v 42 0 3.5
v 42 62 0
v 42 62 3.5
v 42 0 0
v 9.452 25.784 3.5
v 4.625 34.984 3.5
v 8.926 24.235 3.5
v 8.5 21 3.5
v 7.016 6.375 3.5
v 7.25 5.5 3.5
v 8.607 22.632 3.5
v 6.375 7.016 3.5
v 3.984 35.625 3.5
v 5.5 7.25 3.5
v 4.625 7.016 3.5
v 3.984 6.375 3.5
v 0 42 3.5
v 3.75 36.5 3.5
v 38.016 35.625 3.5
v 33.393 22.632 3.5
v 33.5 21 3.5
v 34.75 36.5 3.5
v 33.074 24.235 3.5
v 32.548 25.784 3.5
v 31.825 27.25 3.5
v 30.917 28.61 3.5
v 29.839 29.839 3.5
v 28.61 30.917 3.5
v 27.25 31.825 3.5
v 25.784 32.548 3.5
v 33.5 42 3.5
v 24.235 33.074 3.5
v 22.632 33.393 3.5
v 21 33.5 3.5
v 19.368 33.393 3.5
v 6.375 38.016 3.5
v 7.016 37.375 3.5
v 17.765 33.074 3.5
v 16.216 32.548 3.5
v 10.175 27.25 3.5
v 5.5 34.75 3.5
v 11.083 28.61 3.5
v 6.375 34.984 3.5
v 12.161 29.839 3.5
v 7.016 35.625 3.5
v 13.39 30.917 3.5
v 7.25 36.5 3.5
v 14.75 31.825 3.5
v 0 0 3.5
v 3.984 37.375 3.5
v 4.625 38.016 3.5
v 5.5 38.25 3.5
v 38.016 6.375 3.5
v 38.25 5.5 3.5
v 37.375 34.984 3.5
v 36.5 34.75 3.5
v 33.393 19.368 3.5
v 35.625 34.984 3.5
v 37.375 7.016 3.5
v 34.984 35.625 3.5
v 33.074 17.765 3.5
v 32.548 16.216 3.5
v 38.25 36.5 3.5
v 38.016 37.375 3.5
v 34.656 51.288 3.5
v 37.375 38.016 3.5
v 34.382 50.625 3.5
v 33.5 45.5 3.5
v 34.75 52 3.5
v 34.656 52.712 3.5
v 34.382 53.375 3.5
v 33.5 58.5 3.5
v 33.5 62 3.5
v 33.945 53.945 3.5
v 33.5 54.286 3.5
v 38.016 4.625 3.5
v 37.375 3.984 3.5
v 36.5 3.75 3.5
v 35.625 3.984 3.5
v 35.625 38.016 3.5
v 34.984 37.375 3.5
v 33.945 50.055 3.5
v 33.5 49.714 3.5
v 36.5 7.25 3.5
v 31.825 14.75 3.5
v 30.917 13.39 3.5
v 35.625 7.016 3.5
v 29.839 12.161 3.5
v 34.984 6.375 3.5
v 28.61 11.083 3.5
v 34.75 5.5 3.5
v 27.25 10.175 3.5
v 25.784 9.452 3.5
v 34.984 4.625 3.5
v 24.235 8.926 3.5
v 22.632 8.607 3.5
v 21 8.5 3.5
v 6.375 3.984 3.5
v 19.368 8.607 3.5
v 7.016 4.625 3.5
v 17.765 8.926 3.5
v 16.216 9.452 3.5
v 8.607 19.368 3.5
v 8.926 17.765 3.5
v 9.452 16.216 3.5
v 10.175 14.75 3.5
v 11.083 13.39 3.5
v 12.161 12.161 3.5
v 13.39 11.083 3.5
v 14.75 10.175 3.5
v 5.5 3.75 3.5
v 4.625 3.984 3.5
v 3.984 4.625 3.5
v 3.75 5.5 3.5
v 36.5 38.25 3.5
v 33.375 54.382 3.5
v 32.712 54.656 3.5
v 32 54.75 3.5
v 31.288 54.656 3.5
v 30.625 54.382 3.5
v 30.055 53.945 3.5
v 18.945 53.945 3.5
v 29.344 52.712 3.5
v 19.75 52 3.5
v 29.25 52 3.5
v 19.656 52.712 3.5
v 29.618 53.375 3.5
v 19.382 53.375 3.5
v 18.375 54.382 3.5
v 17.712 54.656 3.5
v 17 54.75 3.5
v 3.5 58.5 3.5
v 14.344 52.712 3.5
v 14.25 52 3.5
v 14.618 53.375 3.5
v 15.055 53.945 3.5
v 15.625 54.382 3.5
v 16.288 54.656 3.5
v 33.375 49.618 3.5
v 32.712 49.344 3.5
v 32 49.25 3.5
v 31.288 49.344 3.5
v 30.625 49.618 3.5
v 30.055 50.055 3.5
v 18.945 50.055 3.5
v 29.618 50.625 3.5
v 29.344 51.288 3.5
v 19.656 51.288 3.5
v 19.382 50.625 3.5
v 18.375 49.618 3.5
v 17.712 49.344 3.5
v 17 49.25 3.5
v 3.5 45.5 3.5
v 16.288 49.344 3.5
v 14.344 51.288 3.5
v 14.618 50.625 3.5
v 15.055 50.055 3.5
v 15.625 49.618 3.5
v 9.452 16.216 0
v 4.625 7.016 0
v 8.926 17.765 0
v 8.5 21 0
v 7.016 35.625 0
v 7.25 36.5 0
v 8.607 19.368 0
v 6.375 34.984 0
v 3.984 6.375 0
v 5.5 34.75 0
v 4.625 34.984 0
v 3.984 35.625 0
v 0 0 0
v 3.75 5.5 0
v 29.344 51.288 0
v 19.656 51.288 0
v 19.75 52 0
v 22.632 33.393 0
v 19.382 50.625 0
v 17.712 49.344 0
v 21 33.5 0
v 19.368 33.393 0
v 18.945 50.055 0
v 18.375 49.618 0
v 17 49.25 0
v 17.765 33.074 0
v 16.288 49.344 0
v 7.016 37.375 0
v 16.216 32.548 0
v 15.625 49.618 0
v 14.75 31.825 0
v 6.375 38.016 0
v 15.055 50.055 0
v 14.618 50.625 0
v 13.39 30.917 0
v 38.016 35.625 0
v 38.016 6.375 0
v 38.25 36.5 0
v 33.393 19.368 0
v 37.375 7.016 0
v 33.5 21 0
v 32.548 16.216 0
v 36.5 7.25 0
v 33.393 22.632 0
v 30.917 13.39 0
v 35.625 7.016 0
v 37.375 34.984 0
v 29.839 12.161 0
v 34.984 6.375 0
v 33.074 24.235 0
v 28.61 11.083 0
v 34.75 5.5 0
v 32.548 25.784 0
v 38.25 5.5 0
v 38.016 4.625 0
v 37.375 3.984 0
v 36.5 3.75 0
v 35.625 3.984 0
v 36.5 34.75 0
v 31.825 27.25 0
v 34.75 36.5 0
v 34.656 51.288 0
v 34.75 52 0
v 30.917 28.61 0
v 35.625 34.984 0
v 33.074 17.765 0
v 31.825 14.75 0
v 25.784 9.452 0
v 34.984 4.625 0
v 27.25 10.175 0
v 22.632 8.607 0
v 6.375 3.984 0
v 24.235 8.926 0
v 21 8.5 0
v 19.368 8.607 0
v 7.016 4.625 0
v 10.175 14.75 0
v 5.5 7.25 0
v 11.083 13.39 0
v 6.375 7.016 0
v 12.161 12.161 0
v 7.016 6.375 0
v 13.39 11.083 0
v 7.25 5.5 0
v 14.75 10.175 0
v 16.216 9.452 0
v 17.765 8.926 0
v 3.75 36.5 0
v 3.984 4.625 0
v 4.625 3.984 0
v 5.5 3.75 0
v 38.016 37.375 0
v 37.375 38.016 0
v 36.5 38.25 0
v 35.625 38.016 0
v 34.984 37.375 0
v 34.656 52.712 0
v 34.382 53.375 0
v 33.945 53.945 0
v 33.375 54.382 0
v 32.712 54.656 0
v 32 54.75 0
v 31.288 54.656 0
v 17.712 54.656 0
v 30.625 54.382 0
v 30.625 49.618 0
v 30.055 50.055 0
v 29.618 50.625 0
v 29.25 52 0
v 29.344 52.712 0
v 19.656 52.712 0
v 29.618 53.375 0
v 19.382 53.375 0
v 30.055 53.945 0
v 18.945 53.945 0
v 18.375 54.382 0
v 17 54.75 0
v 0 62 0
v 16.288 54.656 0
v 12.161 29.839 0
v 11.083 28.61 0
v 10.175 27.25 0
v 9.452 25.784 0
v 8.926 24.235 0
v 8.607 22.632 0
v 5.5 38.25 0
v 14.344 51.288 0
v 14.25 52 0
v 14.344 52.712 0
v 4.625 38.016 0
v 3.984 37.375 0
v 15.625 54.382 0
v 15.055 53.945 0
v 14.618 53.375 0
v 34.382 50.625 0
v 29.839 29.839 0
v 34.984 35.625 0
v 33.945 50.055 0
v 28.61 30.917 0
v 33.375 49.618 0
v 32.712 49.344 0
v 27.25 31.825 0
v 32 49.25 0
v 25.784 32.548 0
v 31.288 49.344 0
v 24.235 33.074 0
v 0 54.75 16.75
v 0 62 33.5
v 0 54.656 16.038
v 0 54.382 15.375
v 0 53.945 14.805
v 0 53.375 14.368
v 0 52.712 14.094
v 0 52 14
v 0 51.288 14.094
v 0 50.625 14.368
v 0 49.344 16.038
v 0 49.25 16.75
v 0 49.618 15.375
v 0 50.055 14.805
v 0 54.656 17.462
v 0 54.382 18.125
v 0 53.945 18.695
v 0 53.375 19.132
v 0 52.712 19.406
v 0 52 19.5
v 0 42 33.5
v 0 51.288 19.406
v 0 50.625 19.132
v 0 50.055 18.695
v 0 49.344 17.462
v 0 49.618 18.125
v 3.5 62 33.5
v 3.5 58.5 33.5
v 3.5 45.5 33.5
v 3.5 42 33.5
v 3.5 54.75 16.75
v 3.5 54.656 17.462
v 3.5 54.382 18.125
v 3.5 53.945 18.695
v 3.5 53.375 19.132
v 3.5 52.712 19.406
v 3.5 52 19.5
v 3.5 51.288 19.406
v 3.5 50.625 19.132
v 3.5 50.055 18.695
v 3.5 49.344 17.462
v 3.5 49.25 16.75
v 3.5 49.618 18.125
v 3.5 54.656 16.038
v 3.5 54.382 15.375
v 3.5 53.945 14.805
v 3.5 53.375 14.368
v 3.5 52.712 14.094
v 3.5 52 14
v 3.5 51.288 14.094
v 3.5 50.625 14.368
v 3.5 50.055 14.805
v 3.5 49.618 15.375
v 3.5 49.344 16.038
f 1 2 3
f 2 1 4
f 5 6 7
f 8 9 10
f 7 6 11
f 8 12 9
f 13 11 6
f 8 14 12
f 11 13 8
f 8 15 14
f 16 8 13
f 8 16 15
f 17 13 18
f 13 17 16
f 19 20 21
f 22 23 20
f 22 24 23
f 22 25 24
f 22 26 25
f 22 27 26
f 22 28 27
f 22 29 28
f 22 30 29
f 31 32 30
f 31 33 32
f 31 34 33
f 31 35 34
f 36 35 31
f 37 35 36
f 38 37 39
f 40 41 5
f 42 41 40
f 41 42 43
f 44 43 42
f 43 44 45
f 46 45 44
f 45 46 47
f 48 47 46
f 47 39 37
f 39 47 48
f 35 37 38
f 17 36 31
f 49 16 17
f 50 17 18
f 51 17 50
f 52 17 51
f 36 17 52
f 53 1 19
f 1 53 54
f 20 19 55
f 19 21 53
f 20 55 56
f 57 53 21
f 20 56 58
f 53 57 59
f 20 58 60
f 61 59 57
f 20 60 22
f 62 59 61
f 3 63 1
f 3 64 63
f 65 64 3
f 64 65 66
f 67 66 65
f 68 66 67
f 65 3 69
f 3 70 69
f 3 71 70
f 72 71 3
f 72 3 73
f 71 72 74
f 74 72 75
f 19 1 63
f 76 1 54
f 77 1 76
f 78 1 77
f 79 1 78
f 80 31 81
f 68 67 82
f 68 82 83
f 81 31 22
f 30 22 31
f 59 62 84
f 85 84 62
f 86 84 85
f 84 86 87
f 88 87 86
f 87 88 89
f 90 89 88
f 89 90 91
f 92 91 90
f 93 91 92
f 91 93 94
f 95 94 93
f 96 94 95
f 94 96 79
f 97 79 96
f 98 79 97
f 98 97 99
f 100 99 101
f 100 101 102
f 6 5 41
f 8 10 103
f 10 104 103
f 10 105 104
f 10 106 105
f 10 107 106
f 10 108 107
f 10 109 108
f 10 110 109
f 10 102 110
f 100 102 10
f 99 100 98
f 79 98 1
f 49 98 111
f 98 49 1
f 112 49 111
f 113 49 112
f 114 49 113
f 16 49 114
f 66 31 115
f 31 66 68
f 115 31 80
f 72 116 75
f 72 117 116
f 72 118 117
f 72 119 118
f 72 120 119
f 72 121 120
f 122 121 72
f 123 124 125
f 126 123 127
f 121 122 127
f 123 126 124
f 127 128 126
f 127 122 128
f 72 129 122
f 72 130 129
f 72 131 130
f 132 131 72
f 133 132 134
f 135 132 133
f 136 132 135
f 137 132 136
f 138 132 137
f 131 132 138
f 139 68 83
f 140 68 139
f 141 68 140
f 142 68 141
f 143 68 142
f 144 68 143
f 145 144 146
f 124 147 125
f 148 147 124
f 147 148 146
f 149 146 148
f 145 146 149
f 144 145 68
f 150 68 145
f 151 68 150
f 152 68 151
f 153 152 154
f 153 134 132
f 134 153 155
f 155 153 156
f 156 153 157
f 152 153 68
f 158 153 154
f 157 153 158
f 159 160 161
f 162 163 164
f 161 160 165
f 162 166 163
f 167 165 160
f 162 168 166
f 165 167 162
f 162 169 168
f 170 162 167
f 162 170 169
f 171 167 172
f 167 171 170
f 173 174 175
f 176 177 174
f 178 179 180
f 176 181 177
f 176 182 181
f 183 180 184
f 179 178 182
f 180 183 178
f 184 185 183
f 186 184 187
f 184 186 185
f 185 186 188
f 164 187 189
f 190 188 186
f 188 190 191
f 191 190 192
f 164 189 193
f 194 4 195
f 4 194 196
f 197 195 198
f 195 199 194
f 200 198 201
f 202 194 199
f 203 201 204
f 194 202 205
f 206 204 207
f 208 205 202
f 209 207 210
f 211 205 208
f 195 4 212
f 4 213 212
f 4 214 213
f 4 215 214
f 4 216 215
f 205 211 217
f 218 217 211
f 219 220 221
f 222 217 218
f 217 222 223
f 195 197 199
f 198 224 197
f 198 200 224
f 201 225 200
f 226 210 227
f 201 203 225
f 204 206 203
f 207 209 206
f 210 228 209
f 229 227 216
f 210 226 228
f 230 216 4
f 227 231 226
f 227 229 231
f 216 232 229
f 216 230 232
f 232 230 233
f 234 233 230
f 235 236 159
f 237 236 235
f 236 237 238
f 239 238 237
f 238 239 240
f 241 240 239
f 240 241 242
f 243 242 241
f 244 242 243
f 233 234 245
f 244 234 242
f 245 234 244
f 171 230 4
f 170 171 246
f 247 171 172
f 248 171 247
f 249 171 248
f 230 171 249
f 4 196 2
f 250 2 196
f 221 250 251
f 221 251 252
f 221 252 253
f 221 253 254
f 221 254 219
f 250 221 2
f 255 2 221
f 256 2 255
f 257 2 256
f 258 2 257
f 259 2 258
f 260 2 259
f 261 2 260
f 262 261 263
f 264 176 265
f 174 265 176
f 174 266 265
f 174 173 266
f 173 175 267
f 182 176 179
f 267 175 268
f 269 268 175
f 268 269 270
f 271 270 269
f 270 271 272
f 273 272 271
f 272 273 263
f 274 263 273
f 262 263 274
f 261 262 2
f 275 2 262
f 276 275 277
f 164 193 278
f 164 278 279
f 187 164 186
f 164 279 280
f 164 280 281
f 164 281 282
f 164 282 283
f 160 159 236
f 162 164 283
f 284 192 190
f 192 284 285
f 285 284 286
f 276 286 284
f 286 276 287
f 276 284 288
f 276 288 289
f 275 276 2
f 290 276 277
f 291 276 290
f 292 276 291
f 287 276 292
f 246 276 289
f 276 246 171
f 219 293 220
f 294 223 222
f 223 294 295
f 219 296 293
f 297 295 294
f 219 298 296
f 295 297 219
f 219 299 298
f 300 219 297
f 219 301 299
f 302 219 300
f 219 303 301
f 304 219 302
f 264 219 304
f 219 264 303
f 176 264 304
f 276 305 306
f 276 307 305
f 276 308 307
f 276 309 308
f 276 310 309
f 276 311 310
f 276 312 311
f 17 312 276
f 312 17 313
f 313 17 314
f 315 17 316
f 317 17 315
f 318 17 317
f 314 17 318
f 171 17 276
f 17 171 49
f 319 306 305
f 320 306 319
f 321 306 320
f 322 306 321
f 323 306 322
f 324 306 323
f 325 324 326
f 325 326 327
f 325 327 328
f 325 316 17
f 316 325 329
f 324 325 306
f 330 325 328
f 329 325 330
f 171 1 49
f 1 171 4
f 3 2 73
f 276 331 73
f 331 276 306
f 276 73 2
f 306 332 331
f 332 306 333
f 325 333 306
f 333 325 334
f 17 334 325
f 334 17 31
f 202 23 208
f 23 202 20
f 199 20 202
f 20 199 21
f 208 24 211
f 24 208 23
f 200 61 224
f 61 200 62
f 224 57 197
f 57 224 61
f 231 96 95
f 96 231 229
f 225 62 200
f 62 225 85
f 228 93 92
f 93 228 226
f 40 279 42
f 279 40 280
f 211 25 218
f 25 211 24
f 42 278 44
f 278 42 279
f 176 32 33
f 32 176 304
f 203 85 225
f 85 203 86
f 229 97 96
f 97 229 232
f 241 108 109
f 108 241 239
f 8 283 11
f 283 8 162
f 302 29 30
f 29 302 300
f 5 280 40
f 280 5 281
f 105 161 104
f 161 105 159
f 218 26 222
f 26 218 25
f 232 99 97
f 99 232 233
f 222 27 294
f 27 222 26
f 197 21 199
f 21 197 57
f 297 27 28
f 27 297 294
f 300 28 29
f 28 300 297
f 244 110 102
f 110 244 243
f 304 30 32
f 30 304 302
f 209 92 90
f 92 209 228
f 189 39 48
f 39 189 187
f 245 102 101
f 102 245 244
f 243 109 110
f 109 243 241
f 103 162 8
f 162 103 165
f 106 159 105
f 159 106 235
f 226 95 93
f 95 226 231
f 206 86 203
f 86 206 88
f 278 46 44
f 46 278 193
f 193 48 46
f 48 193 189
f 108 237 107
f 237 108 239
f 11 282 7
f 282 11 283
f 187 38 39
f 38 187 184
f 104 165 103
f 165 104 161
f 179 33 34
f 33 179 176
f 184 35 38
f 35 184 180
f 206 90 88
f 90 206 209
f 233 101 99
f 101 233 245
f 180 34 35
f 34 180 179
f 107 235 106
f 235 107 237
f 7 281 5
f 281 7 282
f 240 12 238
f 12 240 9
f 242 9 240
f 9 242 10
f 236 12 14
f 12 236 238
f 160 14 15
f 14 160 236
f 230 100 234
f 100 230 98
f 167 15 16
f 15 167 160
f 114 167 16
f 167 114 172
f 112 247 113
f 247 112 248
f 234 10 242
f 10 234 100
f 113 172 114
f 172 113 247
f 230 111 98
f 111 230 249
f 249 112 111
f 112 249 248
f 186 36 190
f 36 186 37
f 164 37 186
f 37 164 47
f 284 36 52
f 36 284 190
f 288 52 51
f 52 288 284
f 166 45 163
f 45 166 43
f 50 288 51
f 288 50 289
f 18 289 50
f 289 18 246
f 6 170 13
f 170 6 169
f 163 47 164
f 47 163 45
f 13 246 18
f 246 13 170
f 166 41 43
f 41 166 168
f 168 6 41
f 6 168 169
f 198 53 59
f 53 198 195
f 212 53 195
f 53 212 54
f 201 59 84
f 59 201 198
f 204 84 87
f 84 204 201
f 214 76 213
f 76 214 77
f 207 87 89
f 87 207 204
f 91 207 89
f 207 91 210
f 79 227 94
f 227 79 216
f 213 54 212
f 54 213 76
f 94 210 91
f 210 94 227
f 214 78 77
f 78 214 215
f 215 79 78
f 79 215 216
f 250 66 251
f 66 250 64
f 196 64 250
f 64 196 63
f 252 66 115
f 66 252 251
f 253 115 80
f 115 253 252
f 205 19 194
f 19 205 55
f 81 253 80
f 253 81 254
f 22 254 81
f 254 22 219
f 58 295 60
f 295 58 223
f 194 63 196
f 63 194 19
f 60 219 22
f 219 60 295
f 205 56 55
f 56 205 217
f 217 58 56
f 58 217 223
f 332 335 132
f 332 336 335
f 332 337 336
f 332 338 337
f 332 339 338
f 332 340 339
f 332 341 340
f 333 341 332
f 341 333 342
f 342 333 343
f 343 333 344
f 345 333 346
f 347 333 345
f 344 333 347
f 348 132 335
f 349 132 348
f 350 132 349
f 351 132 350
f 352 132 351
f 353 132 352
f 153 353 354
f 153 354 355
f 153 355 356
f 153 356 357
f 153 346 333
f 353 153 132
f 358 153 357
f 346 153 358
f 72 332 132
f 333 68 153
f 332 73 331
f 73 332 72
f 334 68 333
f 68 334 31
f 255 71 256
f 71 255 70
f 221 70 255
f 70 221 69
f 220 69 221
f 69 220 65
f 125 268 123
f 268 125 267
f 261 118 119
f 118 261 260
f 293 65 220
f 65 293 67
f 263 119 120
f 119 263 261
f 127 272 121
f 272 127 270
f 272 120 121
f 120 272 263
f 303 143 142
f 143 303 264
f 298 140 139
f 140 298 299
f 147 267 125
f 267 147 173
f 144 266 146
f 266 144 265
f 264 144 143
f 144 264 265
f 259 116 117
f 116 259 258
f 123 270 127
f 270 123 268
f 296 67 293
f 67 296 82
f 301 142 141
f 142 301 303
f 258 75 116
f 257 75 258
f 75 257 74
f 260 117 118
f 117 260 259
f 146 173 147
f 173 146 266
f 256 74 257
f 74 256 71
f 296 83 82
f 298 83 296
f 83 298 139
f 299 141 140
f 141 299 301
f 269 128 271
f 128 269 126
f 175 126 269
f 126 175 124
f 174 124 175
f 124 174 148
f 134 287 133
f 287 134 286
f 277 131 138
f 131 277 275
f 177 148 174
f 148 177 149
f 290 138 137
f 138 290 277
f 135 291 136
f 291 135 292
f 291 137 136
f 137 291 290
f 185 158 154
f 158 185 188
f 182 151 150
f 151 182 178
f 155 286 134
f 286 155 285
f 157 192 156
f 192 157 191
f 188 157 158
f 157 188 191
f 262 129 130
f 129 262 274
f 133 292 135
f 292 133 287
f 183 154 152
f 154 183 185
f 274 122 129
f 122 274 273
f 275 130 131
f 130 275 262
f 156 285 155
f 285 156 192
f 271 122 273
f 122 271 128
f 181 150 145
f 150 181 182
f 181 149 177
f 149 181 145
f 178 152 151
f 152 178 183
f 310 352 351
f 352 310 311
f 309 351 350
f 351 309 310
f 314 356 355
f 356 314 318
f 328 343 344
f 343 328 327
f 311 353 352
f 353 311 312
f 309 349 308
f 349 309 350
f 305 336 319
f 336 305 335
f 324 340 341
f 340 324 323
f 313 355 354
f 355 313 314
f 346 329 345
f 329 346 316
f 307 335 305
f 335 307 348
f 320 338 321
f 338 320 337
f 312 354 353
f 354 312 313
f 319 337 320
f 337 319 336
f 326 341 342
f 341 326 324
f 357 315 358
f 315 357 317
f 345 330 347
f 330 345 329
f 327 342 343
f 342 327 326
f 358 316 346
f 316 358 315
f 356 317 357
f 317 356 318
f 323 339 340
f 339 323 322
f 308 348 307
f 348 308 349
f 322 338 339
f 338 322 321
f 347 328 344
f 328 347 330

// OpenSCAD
t=3.5;

difference()
{
    union()
    {
        cube([42,42,t]);
        
        //translate([-20,0,0])
        //    cube([20,42,t]);
        translate([0,42,0])
            cube([42,20,t]);
        
        //translate([-20,0,t])
        //    cube([20,42,40]);
        translate([0,42,t])
            cube([33.5,20,30]);
    }
    
    union()
    {
        translate([21,21,0])
            cylinder(d=25,h=t,$fn=48);
        
        translate([21-31/2,21-31/2,0])
            cylinder(d=3.5,h=t,$fn=12);
        translate([21-31/2,21+31/2,0])
            cylinder(d=3.5,h=t,$fn=12);
        translate([21+31/2,21-31/2,0])
            cylinder(d=3.5,h=t,$fn=12);
        translate([21+31/2,21+31/2,0])
            cylinder(d=3.5,h=t,$fn=12);
        
        translate([-20+t,0,t])
            cube([20-t*2,42-t,40]);
        translate([0+t,42+t,t])
            cube([33.5-t,20-t*2,30]);
        
        translate([-20,0,t+t-2])
            rotate([45,0,0])
                cube([20,42*sqrt(2),42*sqrt(2)]);
        translate([30+3.5,42,t+t-3.5])
            rotate([0,45+270,0])
                cube([33*sqrt(2),20,33*sqrt(2)]);
        
        translate([-10,10,0])
            cylinder(d=5.5,h=t,$fn=24);
        translate([-10,25,0])
            cylinder(d=5.5,h=t,$fn=24);
            
        translate([-10,42-t,20+14])
            rotate([270,0,0])
                cylinder(d=5.5,h=t,$fn=24);
        translate([-10,42-t,20-11])
            rotate([270,0,0])
                cylinder(d=5.5,h=t,$fn=24);
                
        translate([-10,42-t,20])
            rotate([270,0,0])
                cylinder(d=8,h=t,$fn=24);
        
        translate([42-10,42+10,0])
            cylinder(d=5.5,h=t,$fn=24);
        translate([42-25,42+10,0])
            cylinder(d=5.5,h=t,$fn=24);
            
        translate([0,42+10,t+(30-t)/2])
            rotate([0,90,0])
                cylinder(d=5.5,h=t+1,$fn=24);
    }
}
